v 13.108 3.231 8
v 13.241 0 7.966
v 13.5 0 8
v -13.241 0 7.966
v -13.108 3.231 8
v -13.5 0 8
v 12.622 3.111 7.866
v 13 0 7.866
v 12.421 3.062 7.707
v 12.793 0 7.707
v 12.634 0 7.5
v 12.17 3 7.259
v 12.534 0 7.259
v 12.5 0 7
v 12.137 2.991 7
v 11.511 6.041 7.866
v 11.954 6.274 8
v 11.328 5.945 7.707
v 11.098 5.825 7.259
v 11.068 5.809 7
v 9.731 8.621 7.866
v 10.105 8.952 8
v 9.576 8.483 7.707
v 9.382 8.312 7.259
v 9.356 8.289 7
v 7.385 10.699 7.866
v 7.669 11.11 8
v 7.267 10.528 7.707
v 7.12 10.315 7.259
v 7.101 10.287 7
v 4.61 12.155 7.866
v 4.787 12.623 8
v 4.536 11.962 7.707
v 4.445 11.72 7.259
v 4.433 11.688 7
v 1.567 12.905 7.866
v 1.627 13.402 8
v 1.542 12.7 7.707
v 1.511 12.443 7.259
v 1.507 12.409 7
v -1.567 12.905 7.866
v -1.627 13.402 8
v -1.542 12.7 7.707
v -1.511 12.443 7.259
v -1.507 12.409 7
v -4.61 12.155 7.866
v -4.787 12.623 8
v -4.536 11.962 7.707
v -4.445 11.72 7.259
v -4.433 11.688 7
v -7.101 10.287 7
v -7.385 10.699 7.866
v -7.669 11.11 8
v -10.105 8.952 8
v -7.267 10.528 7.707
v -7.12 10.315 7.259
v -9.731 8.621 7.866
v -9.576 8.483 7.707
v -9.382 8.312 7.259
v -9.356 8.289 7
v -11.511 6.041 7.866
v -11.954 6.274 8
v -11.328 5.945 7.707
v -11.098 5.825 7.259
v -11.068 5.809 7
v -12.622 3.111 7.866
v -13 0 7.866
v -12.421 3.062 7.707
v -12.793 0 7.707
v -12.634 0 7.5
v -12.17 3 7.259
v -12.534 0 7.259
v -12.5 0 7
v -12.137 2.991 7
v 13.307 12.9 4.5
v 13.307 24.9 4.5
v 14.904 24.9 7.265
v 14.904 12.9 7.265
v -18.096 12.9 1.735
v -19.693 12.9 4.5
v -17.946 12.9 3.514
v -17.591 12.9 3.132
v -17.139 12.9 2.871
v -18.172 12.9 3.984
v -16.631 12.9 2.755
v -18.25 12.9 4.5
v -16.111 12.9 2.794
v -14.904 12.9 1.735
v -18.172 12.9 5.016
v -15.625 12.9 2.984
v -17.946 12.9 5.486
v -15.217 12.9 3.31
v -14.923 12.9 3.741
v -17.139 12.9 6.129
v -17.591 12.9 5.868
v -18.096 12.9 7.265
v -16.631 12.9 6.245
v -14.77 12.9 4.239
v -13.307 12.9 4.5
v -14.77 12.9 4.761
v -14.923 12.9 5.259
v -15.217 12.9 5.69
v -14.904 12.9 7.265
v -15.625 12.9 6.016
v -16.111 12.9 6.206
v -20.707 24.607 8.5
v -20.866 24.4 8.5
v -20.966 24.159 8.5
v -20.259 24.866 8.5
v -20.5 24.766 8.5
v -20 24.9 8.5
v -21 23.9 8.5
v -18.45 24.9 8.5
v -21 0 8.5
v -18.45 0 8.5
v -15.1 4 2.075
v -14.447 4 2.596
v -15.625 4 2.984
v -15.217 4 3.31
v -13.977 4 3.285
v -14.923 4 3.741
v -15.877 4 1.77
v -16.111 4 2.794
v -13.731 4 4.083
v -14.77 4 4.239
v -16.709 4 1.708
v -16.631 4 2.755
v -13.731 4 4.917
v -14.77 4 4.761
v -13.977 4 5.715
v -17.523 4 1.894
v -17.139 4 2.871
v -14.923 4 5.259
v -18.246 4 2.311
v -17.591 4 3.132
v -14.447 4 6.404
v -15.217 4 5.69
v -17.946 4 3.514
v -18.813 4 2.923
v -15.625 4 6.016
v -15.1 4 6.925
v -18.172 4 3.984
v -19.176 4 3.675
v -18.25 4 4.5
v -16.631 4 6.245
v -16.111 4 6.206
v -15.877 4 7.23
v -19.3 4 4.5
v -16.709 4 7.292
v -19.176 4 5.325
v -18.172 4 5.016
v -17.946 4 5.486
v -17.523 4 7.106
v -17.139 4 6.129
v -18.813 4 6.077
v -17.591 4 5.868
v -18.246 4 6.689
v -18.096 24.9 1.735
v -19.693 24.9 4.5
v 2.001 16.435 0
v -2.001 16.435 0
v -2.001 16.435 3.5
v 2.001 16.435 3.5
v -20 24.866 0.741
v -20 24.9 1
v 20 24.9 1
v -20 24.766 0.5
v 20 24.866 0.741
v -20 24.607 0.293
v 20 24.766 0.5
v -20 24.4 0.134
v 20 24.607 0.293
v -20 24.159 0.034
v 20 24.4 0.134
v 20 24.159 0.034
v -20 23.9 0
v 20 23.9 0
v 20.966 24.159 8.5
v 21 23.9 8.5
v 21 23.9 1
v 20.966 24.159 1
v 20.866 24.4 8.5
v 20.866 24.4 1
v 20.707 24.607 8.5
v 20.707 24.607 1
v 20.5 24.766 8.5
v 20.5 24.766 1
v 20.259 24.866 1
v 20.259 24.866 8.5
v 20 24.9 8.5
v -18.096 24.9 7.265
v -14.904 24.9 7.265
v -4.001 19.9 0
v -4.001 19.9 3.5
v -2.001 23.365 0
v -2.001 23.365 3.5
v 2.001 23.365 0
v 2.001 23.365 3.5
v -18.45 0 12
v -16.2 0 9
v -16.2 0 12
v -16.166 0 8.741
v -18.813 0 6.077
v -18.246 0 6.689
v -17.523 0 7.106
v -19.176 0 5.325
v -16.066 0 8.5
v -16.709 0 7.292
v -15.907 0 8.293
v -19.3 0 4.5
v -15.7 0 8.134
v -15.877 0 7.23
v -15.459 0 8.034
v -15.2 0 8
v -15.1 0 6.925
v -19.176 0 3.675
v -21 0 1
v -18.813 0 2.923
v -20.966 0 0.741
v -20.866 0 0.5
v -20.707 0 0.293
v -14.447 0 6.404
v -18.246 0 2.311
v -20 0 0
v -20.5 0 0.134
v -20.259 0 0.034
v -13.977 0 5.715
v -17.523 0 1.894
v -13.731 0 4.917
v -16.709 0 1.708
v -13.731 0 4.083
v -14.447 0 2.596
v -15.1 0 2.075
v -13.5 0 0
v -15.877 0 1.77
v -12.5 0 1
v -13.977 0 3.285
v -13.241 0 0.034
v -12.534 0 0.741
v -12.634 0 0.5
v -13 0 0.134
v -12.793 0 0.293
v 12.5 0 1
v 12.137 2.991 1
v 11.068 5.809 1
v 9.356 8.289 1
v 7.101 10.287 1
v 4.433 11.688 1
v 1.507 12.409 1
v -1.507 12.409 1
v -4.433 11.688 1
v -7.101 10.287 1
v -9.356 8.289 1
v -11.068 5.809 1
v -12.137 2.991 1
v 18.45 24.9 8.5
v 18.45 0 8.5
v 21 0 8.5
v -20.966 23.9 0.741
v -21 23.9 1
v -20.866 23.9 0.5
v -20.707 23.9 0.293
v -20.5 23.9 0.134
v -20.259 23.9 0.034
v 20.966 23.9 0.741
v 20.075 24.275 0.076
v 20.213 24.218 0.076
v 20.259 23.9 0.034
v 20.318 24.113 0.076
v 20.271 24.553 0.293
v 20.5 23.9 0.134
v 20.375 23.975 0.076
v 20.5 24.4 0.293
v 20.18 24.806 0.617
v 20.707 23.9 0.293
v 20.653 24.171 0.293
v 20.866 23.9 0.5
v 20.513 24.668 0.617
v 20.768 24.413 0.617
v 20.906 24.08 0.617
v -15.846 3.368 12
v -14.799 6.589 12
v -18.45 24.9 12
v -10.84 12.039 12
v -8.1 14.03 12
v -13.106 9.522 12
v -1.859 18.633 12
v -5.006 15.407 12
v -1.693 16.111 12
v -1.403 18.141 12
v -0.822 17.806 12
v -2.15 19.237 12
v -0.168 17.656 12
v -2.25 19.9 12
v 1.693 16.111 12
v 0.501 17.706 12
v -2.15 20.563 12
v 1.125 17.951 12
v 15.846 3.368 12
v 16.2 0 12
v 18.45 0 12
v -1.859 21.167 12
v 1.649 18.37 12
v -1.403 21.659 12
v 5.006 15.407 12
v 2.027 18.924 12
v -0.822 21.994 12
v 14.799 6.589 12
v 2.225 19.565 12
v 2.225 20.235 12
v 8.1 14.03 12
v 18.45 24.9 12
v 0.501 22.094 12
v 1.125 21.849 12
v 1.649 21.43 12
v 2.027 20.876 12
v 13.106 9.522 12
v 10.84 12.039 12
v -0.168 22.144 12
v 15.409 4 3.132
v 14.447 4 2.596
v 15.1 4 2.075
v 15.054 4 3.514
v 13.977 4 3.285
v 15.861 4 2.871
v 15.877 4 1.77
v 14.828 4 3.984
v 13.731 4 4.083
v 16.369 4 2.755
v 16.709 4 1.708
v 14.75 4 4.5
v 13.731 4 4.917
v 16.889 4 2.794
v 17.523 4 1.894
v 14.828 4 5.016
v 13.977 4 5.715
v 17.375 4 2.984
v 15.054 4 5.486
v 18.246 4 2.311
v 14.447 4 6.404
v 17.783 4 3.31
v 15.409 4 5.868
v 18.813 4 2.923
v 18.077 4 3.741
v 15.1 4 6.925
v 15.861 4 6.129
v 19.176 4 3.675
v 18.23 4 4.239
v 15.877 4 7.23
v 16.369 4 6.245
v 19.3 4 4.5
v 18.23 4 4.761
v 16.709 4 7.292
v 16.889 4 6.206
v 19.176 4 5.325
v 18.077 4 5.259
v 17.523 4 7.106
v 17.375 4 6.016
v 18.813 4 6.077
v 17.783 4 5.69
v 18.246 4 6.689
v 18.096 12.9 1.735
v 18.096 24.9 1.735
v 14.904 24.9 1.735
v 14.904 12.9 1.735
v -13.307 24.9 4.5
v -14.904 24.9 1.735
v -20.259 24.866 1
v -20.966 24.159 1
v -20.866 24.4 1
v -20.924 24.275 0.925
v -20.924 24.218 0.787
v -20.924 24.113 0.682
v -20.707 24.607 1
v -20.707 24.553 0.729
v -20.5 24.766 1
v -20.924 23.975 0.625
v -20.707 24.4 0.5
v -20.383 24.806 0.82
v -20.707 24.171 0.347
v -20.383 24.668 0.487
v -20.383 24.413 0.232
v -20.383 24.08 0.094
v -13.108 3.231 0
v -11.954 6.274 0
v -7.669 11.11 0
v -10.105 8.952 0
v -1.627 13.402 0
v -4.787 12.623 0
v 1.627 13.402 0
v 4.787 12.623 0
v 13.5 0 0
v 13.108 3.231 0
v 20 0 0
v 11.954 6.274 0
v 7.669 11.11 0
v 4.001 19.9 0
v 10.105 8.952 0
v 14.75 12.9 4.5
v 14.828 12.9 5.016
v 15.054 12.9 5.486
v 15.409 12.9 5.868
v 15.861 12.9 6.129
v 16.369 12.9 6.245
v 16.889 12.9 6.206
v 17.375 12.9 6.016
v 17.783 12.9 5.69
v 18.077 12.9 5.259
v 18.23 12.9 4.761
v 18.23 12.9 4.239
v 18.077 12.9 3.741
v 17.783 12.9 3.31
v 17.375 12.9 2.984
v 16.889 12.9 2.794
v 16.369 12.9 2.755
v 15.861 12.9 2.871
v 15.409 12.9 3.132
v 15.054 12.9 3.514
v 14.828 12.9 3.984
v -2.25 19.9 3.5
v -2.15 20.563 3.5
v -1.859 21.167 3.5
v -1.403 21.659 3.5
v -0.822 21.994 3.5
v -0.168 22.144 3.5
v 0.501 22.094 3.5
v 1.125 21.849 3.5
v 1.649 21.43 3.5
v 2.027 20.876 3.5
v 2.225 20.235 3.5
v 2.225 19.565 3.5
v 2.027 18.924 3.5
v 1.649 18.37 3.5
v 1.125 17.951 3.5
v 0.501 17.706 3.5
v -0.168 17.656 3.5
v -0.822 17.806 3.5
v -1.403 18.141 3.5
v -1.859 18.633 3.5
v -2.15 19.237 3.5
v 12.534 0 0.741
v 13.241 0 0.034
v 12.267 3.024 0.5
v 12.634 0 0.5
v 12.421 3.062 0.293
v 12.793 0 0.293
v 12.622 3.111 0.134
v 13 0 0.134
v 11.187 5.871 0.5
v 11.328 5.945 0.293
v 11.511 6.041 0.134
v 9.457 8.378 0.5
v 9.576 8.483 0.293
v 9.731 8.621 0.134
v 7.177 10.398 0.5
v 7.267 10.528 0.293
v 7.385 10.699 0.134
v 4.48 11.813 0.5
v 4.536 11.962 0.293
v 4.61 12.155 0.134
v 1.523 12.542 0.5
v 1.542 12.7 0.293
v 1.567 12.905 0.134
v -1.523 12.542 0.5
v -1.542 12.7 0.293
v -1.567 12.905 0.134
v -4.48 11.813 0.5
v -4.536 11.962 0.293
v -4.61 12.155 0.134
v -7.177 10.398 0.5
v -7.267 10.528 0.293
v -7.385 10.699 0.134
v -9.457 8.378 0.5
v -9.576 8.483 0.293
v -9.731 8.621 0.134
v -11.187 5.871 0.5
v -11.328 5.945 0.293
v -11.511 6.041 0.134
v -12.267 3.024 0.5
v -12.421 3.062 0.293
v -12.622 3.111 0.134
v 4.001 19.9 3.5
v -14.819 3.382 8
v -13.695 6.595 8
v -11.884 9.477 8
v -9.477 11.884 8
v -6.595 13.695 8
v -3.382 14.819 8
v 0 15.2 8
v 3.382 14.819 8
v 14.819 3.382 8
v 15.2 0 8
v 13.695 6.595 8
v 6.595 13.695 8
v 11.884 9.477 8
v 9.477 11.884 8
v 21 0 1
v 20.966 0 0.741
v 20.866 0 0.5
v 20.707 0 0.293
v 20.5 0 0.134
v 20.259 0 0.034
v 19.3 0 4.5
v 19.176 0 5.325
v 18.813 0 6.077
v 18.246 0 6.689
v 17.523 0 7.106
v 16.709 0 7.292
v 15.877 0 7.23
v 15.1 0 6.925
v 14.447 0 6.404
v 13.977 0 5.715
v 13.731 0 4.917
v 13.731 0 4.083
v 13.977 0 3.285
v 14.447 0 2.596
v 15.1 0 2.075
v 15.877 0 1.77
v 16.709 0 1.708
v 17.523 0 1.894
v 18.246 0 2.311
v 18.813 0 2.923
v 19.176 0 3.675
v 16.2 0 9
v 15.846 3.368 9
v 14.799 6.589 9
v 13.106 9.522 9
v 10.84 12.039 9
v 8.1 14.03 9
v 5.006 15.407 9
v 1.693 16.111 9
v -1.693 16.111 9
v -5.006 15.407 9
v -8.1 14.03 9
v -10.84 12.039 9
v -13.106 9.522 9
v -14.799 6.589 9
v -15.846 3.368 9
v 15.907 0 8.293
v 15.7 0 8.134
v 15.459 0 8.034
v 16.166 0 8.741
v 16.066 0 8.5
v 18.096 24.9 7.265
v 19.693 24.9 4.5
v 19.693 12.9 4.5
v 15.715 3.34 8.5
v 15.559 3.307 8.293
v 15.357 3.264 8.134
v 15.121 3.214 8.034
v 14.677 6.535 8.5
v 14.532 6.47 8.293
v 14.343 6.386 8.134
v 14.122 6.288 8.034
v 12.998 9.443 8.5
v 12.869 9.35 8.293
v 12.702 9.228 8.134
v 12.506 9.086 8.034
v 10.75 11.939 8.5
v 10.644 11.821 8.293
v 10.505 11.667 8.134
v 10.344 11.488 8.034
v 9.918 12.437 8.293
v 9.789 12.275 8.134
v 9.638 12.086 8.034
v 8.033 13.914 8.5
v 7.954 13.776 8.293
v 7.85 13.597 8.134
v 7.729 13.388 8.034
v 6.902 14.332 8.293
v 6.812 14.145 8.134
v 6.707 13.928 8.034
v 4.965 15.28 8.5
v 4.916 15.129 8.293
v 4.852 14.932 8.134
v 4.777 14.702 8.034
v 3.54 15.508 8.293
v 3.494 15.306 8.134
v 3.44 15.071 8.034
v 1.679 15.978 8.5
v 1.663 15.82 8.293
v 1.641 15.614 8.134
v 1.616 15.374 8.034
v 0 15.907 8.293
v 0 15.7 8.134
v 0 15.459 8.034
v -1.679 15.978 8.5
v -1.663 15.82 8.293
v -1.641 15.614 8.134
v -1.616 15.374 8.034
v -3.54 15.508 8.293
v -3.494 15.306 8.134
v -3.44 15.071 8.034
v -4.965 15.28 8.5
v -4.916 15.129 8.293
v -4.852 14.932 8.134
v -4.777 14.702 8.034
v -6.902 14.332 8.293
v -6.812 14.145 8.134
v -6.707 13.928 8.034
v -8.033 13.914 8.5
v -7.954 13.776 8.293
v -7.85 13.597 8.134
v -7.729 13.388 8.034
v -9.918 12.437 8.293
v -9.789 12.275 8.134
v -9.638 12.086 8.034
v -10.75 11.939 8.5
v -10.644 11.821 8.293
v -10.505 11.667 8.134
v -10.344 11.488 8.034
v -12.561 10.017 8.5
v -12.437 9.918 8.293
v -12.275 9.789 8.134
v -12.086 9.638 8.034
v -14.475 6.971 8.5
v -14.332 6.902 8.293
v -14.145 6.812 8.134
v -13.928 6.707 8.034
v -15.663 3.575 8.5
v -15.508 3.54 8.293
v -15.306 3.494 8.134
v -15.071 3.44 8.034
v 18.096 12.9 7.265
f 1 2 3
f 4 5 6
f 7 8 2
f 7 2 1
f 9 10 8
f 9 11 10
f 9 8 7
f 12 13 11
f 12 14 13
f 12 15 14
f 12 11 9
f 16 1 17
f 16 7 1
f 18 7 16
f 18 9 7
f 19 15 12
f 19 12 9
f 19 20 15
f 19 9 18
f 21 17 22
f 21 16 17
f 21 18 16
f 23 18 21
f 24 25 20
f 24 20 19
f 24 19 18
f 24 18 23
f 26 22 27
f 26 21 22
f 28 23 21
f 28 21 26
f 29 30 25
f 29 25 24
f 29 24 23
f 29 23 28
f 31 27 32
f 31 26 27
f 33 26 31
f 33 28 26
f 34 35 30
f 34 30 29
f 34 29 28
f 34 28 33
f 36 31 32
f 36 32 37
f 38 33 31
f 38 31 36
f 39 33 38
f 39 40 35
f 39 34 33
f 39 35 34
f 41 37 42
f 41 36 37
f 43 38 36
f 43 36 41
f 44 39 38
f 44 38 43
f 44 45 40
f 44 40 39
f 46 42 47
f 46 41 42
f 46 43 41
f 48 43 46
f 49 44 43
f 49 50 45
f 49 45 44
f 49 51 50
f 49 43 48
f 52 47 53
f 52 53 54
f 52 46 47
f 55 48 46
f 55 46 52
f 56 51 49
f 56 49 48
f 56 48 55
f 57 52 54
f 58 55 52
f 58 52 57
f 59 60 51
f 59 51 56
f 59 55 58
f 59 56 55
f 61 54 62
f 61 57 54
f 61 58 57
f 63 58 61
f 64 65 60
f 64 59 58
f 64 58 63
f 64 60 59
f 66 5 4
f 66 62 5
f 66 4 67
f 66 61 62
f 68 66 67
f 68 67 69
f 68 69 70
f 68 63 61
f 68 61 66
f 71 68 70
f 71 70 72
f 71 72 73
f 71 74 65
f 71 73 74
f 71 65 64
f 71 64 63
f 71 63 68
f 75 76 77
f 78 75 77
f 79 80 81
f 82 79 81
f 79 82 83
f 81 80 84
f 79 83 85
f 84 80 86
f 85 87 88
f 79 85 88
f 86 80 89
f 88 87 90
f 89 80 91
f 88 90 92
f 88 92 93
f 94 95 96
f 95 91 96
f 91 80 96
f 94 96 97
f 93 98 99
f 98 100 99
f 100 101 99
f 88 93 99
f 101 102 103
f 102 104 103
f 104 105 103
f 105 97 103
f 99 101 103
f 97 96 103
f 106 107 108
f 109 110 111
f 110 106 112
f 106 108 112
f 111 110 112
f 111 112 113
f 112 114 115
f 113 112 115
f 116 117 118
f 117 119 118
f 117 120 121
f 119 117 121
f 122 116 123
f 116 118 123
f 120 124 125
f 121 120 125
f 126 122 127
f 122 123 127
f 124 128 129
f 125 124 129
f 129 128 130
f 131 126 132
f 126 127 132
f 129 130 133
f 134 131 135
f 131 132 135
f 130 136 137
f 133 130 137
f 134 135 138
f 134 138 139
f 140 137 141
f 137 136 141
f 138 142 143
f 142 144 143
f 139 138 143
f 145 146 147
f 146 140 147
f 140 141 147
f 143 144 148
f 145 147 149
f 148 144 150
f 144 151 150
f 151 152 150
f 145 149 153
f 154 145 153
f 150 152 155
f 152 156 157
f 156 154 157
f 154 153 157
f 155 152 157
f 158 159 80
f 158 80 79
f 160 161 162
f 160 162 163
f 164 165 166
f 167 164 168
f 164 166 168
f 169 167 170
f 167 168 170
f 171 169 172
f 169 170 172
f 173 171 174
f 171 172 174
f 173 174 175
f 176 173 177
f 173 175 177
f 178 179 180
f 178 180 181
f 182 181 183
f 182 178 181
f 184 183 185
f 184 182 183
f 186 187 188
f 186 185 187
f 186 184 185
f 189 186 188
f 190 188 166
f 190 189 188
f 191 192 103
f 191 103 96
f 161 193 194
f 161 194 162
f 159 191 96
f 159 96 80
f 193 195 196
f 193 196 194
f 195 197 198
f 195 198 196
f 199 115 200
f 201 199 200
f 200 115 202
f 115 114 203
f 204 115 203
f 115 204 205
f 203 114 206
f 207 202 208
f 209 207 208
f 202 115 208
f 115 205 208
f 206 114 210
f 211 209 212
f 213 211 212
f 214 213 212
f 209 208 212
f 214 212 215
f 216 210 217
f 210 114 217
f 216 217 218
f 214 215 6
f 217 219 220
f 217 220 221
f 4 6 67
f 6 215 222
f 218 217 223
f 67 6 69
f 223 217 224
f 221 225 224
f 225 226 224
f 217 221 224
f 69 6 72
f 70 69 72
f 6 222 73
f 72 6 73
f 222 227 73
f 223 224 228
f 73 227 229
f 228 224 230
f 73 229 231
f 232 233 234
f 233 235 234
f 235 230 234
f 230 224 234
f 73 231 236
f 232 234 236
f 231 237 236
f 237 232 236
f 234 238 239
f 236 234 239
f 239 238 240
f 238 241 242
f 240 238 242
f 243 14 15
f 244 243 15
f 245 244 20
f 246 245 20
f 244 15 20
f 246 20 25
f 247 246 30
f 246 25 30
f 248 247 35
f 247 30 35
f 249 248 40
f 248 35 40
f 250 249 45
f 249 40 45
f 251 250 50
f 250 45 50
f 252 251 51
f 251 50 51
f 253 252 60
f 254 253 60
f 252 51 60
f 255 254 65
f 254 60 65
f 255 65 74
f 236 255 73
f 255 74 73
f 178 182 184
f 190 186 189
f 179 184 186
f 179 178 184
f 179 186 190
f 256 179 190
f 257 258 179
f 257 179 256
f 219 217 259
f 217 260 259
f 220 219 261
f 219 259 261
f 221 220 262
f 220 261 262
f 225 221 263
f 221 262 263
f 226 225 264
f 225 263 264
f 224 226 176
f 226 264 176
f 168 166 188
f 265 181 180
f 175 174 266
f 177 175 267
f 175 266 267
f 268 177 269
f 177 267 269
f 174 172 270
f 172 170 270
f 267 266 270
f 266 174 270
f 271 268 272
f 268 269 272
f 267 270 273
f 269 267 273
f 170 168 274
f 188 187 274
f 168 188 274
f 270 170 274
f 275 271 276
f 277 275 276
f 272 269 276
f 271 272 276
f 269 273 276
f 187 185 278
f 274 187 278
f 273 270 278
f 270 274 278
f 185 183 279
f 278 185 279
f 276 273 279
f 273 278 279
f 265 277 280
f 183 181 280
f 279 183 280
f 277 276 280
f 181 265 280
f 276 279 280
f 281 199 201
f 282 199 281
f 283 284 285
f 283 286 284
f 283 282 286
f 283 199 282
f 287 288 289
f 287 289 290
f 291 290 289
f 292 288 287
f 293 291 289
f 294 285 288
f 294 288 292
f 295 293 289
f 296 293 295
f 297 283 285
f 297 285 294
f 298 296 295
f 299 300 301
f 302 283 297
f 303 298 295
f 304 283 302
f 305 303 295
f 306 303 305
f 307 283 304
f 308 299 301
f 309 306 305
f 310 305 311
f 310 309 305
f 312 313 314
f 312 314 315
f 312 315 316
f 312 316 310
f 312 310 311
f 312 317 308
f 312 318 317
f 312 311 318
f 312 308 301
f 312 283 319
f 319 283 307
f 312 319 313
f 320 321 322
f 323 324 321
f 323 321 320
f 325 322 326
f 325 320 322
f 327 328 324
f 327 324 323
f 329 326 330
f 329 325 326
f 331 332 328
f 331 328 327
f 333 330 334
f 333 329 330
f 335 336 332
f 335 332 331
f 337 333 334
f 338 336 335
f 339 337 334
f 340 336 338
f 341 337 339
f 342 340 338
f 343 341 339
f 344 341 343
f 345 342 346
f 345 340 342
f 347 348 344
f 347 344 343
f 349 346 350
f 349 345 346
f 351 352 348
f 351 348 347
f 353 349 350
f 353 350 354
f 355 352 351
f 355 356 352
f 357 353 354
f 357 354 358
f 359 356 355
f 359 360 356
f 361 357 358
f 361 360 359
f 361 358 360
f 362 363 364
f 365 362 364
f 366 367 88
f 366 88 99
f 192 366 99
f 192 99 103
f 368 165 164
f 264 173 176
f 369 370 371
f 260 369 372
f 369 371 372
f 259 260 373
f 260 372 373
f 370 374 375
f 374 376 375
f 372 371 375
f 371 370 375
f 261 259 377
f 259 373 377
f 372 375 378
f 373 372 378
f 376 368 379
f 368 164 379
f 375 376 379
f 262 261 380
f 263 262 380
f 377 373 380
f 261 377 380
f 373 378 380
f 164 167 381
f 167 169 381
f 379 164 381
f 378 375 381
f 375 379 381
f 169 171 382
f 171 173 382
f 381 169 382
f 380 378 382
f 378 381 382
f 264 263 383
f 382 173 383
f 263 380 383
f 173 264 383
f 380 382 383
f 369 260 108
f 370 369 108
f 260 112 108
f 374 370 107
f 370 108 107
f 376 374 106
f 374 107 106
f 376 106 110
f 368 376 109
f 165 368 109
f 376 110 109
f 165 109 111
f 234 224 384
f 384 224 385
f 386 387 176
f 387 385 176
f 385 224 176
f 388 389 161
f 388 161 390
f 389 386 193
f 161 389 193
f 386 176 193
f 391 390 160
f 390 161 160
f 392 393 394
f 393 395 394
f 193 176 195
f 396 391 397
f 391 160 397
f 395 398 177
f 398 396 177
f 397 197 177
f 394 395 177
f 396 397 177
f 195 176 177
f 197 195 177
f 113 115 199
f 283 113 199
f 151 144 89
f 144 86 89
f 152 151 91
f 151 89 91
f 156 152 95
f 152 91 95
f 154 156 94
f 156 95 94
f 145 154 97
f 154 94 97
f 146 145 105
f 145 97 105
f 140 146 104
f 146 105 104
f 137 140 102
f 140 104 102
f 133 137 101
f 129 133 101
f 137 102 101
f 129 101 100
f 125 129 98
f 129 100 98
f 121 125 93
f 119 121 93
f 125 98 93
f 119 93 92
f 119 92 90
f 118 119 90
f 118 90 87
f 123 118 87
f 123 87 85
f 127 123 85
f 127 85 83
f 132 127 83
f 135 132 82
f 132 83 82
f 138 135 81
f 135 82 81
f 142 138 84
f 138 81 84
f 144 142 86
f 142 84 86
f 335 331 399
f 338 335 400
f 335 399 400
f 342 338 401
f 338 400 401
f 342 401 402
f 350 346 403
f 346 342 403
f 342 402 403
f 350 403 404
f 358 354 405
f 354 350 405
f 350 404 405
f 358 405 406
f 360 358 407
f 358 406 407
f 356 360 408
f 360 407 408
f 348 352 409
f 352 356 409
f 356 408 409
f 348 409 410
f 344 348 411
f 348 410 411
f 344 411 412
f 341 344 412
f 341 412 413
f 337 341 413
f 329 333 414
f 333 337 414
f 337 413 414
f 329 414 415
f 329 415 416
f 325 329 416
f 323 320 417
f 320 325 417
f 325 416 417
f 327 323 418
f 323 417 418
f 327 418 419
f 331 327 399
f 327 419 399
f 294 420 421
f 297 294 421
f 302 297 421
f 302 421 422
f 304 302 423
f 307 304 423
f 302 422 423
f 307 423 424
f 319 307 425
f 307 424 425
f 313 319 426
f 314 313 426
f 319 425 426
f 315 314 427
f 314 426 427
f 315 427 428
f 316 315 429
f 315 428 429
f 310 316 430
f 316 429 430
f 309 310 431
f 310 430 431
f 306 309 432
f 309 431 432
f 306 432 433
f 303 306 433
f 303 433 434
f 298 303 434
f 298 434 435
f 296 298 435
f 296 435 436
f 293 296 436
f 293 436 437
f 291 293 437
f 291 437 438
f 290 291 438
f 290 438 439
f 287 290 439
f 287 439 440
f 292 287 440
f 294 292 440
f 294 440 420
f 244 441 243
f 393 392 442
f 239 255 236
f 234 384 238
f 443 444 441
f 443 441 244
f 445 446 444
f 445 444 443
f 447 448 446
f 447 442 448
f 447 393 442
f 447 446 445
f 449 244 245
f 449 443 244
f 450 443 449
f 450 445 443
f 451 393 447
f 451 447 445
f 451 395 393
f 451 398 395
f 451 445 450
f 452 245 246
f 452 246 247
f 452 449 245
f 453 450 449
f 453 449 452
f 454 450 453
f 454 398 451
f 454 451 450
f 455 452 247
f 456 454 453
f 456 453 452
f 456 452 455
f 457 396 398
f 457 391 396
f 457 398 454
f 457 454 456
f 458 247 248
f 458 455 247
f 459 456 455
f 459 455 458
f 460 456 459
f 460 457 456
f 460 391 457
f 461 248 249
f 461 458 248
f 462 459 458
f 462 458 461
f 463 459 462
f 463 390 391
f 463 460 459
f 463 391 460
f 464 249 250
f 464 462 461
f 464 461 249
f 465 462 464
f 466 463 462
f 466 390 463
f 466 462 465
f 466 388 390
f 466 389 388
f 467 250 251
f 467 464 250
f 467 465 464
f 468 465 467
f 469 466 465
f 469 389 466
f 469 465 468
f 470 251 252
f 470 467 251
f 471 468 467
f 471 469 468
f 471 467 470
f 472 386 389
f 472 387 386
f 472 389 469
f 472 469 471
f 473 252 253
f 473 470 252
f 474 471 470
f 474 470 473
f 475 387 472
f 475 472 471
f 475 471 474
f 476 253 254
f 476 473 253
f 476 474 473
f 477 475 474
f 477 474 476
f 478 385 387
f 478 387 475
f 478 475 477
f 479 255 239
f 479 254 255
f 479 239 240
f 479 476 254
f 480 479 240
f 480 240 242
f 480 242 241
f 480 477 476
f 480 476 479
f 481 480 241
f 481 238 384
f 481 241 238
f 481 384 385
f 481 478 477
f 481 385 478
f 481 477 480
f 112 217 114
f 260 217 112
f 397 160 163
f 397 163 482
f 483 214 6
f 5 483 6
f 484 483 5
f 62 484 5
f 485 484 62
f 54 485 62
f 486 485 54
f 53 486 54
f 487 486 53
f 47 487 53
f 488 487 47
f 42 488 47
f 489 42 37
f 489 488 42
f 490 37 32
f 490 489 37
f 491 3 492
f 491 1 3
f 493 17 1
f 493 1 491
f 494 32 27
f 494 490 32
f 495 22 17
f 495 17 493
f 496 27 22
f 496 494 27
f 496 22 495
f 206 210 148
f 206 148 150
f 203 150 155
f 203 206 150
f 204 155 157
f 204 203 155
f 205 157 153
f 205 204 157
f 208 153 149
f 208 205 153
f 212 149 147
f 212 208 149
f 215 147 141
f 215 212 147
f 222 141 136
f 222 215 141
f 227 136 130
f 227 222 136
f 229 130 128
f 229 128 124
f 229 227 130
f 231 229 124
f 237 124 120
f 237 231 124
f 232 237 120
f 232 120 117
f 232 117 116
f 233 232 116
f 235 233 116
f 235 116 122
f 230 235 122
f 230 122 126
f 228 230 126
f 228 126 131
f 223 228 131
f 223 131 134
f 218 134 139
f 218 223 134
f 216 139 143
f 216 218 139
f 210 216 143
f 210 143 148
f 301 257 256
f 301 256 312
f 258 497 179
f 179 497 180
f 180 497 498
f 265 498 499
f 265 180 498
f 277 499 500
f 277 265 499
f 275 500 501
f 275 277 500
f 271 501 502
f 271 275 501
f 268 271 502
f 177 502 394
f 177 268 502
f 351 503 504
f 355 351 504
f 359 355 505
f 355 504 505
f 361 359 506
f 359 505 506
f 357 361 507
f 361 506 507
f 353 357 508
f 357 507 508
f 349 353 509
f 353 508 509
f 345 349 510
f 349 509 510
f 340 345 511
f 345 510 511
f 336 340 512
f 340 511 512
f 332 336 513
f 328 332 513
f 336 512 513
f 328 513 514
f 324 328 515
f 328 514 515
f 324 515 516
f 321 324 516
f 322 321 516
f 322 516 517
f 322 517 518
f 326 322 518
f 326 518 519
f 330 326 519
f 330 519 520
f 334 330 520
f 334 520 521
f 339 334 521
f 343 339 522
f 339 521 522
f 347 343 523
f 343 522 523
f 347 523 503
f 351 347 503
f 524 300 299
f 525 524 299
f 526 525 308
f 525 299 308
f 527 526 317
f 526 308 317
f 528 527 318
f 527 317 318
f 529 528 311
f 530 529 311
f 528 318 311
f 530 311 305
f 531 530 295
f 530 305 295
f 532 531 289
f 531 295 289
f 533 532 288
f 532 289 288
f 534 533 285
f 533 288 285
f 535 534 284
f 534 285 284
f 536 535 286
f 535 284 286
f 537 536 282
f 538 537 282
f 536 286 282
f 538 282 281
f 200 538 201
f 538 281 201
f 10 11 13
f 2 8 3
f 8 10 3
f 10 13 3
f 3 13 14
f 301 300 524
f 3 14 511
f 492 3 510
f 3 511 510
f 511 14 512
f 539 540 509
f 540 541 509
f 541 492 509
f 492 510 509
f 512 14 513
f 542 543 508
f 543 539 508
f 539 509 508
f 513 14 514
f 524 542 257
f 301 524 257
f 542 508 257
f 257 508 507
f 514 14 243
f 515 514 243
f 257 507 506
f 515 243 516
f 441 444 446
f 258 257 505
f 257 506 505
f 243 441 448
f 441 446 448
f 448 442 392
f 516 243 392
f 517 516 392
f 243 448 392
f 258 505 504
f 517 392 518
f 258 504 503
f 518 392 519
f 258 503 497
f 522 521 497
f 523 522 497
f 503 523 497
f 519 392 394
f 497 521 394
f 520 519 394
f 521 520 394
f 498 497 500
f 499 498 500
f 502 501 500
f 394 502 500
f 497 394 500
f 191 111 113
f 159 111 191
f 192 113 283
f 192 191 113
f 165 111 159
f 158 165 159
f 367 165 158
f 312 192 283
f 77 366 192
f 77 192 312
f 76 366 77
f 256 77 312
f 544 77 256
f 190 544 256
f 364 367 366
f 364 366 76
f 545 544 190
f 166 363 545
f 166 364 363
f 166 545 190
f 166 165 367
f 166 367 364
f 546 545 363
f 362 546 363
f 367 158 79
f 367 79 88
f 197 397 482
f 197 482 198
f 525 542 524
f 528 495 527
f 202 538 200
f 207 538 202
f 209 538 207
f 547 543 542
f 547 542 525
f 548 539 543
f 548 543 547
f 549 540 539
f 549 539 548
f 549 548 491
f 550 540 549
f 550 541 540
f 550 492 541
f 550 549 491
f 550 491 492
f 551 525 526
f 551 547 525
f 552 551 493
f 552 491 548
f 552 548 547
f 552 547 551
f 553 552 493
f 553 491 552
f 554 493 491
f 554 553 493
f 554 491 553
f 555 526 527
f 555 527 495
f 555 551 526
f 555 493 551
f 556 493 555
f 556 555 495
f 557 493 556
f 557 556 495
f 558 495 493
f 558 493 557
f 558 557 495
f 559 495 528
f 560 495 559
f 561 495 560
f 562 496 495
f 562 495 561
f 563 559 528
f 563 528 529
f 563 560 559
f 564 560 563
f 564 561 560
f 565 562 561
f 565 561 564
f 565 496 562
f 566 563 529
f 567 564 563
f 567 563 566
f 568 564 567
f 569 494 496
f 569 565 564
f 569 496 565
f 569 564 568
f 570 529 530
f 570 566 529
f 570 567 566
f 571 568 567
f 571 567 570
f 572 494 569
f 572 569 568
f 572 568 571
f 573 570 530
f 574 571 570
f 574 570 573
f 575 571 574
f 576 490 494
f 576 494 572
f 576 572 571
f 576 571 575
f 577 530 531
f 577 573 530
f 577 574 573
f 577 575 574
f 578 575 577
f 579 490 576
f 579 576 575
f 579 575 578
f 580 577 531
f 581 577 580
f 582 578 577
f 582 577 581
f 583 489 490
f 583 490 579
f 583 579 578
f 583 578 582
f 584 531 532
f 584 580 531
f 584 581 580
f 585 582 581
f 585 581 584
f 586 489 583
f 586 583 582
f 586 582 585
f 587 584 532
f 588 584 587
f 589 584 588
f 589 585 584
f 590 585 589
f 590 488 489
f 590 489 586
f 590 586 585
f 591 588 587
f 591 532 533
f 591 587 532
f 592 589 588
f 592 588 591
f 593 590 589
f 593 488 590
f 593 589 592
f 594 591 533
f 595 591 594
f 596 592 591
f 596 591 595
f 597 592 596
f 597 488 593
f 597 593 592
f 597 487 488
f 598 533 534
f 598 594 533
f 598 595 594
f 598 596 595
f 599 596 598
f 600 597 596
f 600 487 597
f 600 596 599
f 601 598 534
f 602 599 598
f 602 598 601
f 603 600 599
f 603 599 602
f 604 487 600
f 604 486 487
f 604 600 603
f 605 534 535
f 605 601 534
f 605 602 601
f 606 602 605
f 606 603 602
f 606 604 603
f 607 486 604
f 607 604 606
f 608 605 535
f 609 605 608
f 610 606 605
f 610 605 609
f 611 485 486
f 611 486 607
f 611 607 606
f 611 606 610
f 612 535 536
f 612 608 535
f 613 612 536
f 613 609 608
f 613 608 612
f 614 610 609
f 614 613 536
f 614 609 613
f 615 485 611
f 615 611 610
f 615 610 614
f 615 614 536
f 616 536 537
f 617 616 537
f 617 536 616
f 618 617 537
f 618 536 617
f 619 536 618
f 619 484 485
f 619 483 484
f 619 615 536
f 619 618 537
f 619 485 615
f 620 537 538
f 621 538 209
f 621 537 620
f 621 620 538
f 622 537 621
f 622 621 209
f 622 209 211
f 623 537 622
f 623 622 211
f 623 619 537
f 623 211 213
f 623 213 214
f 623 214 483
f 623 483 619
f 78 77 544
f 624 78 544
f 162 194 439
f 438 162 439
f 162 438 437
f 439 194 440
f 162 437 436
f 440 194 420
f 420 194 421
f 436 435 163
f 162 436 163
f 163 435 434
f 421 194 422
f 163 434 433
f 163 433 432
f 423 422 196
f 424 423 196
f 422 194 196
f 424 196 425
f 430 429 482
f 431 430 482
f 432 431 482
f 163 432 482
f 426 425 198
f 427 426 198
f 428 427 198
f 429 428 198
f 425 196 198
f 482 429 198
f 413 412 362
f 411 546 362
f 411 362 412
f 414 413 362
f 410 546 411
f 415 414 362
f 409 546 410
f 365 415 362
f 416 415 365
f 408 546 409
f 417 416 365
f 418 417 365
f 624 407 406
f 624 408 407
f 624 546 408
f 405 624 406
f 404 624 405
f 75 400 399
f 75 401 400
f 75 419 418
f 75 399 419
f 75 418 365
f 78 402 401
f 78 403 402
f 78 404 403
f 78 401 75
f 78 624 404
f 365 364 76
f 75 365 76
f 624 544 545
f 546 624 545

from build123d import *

# Parameters (mm, degrees)
F0_W      = 42
F0_H      = 24.9
F1_DEPTH  = 12
F3_DEPTH  = 4
F5_DEPTH  = 8
F7_D      = 4.5
F8_W      = 2.55
F8_H      = 3.5
F9_DEPTH  = 24.9
F12_D     = 3.5
F14_DEPTH = 3.5
F15_R     = 2.8
F15_R_2   = 1.75
F16_DEPTH = 4
F17_R     = 1.75
F18_DEPTH = 12
F19_R     = 1


# Not quite as in the source:
# - a pattern or mirror of a feature is missing from the dataset's text; its kind, count and spacing are read off the source's solid


with BuildPart() as f1:
    # F0 (on Top) → F1 (new body)
    with BuildSketch(Plane.XY):
        with Locations((0, 12.45)):
            Rectangle(F0_W, F0_H)
    extrude(amount=F1_DEPTH)

    # F2 (on face) → F3 (cut)
    with BuildSketch(Plane.XY.offset(12)):
        with BuildLine():
            Line((-16.2, 0), (16.2, 0))
            ThreePointArc((16.2, 0), (0, 16.2), (-16.2, 0))
        make_face()
    extrude(amount=-F3_DEPTH, mode=Mode.SUBTRACT)

    # F4 (on face) → F5 (cut, through all)
    with BuildSketch(Plane.XY.offset(8)):
        with BuildLine():
            Line((-12.5, 0), (12.5, 0))
            ThreePointArc((12.5, 0), (0, 12.5), (-12.5, 0))
        make_face()
    extrude(amount=-F5_DEPTH, mode=Mode.SUBTRACT)

    # F7 (through all)
    with Locations(Plane.XY.offset(12)):
        with Locations((0, 19.9)):
            Hole(F7_D / 2)

    # F8 (on face) → F9 (cut, through all)
    with BuildSketch(Plane.XZ):
        with Locations((-19.725, 10.25)):
            Rectangle(F8_W, F8_H)
    f9 = extrude(amount=-F9_DEPTH, mode=Mode.SUBTRACT)

    # F9_copies: F9 across plane
    add(f9.mirror(Plane(origin=(0, 0, 0), x_dir=(0, 0, 1), z_dir=(1, 0, 0))), mode=Mode.SUBTRACT)

    # F12 (through all)
    with Locations(Plane.XZ):
        with Locations((-16.5, 4.5), (16.5, 4.5)):
            Hole(F12_D / 2)

    # F13 (on face) → F14 (cut)
    with BuildSketch(Plane.XY):
        Polygon((-2.0005186827, 23.365), (-4.0010373655, 19.9), (-2.0005186827, 16.435), (2.0005186827, 16.435), (4.0010373655, 19.9), (2.0005186827, 23.365), align=None)
    extrude(amount=F14_DEPTH, mode=Mode.SUBTRACT)

    # F15 (on face) → F16 (cut)
    with BuildSketch(Plane.XZ):
        with Locations((16.5, 4.5)):
            Circle(F15_R)
        with Locations((16.5, 4.5)):
            Circle(F15_R_2, mode=Mode.SUBTRACT)
    f16 = extrude(amount=-F16_DEPTH, mode=Mode.SUBTRACT)

    # F16_copies: F16 across plane
    add(f16.mirror(Plane(origin=(0, 0, 0), x_dir=(0, 0, -1), z_dir=(-1, 0, 0))), mode=Mode.SUBTRACT)

    # F17 (on face) → F18 (cut)
    with BuildSketch(Plane(origin=(0, 24.9, 0), x_dir=(-1, 0, 0), z_dir=(0, 1, 0))):
        Polygon((-19.6927469886, 4.5), (-18.0963734943, 1.735), (-14.9036265057, 1.735), (-13.3072530114, 4.5), (-14.9036265057, 7.265), (-18.0963734943, 7.265), align=None)
        with Locations((-16.5, 4.5)):
            Circle(F17_R, mode=Mode.SUBTRACT)
    f18 = extrude(amount=-F18_DEPTH, mode=Mode.SUBTRACT)

    # F18_copies: F18 across plane
    add(f18.mirror(Plane(origin=(0, 0, 0), x_dir=(0, 0, -1), z_dir=(-1, 0, 0))), mode=Mode.SUBTRACT)

    # F19
    f19_edges = [f1.edges().sort_by_distance(p)[0] for p in [
        (21, 24.9, 4.25),
        (0, 24.9, 0),
        (-21, 24.9, 4.25),
        (-21, 12.45, 0),
        (21, 12.45, 0),
        (0, 12.5, 0),
        (0, 12.5, 8),
        (0, 16.2, 8),
    ]]
    fillet(f19_edges, radius=F19_R)


solid = f1.part
